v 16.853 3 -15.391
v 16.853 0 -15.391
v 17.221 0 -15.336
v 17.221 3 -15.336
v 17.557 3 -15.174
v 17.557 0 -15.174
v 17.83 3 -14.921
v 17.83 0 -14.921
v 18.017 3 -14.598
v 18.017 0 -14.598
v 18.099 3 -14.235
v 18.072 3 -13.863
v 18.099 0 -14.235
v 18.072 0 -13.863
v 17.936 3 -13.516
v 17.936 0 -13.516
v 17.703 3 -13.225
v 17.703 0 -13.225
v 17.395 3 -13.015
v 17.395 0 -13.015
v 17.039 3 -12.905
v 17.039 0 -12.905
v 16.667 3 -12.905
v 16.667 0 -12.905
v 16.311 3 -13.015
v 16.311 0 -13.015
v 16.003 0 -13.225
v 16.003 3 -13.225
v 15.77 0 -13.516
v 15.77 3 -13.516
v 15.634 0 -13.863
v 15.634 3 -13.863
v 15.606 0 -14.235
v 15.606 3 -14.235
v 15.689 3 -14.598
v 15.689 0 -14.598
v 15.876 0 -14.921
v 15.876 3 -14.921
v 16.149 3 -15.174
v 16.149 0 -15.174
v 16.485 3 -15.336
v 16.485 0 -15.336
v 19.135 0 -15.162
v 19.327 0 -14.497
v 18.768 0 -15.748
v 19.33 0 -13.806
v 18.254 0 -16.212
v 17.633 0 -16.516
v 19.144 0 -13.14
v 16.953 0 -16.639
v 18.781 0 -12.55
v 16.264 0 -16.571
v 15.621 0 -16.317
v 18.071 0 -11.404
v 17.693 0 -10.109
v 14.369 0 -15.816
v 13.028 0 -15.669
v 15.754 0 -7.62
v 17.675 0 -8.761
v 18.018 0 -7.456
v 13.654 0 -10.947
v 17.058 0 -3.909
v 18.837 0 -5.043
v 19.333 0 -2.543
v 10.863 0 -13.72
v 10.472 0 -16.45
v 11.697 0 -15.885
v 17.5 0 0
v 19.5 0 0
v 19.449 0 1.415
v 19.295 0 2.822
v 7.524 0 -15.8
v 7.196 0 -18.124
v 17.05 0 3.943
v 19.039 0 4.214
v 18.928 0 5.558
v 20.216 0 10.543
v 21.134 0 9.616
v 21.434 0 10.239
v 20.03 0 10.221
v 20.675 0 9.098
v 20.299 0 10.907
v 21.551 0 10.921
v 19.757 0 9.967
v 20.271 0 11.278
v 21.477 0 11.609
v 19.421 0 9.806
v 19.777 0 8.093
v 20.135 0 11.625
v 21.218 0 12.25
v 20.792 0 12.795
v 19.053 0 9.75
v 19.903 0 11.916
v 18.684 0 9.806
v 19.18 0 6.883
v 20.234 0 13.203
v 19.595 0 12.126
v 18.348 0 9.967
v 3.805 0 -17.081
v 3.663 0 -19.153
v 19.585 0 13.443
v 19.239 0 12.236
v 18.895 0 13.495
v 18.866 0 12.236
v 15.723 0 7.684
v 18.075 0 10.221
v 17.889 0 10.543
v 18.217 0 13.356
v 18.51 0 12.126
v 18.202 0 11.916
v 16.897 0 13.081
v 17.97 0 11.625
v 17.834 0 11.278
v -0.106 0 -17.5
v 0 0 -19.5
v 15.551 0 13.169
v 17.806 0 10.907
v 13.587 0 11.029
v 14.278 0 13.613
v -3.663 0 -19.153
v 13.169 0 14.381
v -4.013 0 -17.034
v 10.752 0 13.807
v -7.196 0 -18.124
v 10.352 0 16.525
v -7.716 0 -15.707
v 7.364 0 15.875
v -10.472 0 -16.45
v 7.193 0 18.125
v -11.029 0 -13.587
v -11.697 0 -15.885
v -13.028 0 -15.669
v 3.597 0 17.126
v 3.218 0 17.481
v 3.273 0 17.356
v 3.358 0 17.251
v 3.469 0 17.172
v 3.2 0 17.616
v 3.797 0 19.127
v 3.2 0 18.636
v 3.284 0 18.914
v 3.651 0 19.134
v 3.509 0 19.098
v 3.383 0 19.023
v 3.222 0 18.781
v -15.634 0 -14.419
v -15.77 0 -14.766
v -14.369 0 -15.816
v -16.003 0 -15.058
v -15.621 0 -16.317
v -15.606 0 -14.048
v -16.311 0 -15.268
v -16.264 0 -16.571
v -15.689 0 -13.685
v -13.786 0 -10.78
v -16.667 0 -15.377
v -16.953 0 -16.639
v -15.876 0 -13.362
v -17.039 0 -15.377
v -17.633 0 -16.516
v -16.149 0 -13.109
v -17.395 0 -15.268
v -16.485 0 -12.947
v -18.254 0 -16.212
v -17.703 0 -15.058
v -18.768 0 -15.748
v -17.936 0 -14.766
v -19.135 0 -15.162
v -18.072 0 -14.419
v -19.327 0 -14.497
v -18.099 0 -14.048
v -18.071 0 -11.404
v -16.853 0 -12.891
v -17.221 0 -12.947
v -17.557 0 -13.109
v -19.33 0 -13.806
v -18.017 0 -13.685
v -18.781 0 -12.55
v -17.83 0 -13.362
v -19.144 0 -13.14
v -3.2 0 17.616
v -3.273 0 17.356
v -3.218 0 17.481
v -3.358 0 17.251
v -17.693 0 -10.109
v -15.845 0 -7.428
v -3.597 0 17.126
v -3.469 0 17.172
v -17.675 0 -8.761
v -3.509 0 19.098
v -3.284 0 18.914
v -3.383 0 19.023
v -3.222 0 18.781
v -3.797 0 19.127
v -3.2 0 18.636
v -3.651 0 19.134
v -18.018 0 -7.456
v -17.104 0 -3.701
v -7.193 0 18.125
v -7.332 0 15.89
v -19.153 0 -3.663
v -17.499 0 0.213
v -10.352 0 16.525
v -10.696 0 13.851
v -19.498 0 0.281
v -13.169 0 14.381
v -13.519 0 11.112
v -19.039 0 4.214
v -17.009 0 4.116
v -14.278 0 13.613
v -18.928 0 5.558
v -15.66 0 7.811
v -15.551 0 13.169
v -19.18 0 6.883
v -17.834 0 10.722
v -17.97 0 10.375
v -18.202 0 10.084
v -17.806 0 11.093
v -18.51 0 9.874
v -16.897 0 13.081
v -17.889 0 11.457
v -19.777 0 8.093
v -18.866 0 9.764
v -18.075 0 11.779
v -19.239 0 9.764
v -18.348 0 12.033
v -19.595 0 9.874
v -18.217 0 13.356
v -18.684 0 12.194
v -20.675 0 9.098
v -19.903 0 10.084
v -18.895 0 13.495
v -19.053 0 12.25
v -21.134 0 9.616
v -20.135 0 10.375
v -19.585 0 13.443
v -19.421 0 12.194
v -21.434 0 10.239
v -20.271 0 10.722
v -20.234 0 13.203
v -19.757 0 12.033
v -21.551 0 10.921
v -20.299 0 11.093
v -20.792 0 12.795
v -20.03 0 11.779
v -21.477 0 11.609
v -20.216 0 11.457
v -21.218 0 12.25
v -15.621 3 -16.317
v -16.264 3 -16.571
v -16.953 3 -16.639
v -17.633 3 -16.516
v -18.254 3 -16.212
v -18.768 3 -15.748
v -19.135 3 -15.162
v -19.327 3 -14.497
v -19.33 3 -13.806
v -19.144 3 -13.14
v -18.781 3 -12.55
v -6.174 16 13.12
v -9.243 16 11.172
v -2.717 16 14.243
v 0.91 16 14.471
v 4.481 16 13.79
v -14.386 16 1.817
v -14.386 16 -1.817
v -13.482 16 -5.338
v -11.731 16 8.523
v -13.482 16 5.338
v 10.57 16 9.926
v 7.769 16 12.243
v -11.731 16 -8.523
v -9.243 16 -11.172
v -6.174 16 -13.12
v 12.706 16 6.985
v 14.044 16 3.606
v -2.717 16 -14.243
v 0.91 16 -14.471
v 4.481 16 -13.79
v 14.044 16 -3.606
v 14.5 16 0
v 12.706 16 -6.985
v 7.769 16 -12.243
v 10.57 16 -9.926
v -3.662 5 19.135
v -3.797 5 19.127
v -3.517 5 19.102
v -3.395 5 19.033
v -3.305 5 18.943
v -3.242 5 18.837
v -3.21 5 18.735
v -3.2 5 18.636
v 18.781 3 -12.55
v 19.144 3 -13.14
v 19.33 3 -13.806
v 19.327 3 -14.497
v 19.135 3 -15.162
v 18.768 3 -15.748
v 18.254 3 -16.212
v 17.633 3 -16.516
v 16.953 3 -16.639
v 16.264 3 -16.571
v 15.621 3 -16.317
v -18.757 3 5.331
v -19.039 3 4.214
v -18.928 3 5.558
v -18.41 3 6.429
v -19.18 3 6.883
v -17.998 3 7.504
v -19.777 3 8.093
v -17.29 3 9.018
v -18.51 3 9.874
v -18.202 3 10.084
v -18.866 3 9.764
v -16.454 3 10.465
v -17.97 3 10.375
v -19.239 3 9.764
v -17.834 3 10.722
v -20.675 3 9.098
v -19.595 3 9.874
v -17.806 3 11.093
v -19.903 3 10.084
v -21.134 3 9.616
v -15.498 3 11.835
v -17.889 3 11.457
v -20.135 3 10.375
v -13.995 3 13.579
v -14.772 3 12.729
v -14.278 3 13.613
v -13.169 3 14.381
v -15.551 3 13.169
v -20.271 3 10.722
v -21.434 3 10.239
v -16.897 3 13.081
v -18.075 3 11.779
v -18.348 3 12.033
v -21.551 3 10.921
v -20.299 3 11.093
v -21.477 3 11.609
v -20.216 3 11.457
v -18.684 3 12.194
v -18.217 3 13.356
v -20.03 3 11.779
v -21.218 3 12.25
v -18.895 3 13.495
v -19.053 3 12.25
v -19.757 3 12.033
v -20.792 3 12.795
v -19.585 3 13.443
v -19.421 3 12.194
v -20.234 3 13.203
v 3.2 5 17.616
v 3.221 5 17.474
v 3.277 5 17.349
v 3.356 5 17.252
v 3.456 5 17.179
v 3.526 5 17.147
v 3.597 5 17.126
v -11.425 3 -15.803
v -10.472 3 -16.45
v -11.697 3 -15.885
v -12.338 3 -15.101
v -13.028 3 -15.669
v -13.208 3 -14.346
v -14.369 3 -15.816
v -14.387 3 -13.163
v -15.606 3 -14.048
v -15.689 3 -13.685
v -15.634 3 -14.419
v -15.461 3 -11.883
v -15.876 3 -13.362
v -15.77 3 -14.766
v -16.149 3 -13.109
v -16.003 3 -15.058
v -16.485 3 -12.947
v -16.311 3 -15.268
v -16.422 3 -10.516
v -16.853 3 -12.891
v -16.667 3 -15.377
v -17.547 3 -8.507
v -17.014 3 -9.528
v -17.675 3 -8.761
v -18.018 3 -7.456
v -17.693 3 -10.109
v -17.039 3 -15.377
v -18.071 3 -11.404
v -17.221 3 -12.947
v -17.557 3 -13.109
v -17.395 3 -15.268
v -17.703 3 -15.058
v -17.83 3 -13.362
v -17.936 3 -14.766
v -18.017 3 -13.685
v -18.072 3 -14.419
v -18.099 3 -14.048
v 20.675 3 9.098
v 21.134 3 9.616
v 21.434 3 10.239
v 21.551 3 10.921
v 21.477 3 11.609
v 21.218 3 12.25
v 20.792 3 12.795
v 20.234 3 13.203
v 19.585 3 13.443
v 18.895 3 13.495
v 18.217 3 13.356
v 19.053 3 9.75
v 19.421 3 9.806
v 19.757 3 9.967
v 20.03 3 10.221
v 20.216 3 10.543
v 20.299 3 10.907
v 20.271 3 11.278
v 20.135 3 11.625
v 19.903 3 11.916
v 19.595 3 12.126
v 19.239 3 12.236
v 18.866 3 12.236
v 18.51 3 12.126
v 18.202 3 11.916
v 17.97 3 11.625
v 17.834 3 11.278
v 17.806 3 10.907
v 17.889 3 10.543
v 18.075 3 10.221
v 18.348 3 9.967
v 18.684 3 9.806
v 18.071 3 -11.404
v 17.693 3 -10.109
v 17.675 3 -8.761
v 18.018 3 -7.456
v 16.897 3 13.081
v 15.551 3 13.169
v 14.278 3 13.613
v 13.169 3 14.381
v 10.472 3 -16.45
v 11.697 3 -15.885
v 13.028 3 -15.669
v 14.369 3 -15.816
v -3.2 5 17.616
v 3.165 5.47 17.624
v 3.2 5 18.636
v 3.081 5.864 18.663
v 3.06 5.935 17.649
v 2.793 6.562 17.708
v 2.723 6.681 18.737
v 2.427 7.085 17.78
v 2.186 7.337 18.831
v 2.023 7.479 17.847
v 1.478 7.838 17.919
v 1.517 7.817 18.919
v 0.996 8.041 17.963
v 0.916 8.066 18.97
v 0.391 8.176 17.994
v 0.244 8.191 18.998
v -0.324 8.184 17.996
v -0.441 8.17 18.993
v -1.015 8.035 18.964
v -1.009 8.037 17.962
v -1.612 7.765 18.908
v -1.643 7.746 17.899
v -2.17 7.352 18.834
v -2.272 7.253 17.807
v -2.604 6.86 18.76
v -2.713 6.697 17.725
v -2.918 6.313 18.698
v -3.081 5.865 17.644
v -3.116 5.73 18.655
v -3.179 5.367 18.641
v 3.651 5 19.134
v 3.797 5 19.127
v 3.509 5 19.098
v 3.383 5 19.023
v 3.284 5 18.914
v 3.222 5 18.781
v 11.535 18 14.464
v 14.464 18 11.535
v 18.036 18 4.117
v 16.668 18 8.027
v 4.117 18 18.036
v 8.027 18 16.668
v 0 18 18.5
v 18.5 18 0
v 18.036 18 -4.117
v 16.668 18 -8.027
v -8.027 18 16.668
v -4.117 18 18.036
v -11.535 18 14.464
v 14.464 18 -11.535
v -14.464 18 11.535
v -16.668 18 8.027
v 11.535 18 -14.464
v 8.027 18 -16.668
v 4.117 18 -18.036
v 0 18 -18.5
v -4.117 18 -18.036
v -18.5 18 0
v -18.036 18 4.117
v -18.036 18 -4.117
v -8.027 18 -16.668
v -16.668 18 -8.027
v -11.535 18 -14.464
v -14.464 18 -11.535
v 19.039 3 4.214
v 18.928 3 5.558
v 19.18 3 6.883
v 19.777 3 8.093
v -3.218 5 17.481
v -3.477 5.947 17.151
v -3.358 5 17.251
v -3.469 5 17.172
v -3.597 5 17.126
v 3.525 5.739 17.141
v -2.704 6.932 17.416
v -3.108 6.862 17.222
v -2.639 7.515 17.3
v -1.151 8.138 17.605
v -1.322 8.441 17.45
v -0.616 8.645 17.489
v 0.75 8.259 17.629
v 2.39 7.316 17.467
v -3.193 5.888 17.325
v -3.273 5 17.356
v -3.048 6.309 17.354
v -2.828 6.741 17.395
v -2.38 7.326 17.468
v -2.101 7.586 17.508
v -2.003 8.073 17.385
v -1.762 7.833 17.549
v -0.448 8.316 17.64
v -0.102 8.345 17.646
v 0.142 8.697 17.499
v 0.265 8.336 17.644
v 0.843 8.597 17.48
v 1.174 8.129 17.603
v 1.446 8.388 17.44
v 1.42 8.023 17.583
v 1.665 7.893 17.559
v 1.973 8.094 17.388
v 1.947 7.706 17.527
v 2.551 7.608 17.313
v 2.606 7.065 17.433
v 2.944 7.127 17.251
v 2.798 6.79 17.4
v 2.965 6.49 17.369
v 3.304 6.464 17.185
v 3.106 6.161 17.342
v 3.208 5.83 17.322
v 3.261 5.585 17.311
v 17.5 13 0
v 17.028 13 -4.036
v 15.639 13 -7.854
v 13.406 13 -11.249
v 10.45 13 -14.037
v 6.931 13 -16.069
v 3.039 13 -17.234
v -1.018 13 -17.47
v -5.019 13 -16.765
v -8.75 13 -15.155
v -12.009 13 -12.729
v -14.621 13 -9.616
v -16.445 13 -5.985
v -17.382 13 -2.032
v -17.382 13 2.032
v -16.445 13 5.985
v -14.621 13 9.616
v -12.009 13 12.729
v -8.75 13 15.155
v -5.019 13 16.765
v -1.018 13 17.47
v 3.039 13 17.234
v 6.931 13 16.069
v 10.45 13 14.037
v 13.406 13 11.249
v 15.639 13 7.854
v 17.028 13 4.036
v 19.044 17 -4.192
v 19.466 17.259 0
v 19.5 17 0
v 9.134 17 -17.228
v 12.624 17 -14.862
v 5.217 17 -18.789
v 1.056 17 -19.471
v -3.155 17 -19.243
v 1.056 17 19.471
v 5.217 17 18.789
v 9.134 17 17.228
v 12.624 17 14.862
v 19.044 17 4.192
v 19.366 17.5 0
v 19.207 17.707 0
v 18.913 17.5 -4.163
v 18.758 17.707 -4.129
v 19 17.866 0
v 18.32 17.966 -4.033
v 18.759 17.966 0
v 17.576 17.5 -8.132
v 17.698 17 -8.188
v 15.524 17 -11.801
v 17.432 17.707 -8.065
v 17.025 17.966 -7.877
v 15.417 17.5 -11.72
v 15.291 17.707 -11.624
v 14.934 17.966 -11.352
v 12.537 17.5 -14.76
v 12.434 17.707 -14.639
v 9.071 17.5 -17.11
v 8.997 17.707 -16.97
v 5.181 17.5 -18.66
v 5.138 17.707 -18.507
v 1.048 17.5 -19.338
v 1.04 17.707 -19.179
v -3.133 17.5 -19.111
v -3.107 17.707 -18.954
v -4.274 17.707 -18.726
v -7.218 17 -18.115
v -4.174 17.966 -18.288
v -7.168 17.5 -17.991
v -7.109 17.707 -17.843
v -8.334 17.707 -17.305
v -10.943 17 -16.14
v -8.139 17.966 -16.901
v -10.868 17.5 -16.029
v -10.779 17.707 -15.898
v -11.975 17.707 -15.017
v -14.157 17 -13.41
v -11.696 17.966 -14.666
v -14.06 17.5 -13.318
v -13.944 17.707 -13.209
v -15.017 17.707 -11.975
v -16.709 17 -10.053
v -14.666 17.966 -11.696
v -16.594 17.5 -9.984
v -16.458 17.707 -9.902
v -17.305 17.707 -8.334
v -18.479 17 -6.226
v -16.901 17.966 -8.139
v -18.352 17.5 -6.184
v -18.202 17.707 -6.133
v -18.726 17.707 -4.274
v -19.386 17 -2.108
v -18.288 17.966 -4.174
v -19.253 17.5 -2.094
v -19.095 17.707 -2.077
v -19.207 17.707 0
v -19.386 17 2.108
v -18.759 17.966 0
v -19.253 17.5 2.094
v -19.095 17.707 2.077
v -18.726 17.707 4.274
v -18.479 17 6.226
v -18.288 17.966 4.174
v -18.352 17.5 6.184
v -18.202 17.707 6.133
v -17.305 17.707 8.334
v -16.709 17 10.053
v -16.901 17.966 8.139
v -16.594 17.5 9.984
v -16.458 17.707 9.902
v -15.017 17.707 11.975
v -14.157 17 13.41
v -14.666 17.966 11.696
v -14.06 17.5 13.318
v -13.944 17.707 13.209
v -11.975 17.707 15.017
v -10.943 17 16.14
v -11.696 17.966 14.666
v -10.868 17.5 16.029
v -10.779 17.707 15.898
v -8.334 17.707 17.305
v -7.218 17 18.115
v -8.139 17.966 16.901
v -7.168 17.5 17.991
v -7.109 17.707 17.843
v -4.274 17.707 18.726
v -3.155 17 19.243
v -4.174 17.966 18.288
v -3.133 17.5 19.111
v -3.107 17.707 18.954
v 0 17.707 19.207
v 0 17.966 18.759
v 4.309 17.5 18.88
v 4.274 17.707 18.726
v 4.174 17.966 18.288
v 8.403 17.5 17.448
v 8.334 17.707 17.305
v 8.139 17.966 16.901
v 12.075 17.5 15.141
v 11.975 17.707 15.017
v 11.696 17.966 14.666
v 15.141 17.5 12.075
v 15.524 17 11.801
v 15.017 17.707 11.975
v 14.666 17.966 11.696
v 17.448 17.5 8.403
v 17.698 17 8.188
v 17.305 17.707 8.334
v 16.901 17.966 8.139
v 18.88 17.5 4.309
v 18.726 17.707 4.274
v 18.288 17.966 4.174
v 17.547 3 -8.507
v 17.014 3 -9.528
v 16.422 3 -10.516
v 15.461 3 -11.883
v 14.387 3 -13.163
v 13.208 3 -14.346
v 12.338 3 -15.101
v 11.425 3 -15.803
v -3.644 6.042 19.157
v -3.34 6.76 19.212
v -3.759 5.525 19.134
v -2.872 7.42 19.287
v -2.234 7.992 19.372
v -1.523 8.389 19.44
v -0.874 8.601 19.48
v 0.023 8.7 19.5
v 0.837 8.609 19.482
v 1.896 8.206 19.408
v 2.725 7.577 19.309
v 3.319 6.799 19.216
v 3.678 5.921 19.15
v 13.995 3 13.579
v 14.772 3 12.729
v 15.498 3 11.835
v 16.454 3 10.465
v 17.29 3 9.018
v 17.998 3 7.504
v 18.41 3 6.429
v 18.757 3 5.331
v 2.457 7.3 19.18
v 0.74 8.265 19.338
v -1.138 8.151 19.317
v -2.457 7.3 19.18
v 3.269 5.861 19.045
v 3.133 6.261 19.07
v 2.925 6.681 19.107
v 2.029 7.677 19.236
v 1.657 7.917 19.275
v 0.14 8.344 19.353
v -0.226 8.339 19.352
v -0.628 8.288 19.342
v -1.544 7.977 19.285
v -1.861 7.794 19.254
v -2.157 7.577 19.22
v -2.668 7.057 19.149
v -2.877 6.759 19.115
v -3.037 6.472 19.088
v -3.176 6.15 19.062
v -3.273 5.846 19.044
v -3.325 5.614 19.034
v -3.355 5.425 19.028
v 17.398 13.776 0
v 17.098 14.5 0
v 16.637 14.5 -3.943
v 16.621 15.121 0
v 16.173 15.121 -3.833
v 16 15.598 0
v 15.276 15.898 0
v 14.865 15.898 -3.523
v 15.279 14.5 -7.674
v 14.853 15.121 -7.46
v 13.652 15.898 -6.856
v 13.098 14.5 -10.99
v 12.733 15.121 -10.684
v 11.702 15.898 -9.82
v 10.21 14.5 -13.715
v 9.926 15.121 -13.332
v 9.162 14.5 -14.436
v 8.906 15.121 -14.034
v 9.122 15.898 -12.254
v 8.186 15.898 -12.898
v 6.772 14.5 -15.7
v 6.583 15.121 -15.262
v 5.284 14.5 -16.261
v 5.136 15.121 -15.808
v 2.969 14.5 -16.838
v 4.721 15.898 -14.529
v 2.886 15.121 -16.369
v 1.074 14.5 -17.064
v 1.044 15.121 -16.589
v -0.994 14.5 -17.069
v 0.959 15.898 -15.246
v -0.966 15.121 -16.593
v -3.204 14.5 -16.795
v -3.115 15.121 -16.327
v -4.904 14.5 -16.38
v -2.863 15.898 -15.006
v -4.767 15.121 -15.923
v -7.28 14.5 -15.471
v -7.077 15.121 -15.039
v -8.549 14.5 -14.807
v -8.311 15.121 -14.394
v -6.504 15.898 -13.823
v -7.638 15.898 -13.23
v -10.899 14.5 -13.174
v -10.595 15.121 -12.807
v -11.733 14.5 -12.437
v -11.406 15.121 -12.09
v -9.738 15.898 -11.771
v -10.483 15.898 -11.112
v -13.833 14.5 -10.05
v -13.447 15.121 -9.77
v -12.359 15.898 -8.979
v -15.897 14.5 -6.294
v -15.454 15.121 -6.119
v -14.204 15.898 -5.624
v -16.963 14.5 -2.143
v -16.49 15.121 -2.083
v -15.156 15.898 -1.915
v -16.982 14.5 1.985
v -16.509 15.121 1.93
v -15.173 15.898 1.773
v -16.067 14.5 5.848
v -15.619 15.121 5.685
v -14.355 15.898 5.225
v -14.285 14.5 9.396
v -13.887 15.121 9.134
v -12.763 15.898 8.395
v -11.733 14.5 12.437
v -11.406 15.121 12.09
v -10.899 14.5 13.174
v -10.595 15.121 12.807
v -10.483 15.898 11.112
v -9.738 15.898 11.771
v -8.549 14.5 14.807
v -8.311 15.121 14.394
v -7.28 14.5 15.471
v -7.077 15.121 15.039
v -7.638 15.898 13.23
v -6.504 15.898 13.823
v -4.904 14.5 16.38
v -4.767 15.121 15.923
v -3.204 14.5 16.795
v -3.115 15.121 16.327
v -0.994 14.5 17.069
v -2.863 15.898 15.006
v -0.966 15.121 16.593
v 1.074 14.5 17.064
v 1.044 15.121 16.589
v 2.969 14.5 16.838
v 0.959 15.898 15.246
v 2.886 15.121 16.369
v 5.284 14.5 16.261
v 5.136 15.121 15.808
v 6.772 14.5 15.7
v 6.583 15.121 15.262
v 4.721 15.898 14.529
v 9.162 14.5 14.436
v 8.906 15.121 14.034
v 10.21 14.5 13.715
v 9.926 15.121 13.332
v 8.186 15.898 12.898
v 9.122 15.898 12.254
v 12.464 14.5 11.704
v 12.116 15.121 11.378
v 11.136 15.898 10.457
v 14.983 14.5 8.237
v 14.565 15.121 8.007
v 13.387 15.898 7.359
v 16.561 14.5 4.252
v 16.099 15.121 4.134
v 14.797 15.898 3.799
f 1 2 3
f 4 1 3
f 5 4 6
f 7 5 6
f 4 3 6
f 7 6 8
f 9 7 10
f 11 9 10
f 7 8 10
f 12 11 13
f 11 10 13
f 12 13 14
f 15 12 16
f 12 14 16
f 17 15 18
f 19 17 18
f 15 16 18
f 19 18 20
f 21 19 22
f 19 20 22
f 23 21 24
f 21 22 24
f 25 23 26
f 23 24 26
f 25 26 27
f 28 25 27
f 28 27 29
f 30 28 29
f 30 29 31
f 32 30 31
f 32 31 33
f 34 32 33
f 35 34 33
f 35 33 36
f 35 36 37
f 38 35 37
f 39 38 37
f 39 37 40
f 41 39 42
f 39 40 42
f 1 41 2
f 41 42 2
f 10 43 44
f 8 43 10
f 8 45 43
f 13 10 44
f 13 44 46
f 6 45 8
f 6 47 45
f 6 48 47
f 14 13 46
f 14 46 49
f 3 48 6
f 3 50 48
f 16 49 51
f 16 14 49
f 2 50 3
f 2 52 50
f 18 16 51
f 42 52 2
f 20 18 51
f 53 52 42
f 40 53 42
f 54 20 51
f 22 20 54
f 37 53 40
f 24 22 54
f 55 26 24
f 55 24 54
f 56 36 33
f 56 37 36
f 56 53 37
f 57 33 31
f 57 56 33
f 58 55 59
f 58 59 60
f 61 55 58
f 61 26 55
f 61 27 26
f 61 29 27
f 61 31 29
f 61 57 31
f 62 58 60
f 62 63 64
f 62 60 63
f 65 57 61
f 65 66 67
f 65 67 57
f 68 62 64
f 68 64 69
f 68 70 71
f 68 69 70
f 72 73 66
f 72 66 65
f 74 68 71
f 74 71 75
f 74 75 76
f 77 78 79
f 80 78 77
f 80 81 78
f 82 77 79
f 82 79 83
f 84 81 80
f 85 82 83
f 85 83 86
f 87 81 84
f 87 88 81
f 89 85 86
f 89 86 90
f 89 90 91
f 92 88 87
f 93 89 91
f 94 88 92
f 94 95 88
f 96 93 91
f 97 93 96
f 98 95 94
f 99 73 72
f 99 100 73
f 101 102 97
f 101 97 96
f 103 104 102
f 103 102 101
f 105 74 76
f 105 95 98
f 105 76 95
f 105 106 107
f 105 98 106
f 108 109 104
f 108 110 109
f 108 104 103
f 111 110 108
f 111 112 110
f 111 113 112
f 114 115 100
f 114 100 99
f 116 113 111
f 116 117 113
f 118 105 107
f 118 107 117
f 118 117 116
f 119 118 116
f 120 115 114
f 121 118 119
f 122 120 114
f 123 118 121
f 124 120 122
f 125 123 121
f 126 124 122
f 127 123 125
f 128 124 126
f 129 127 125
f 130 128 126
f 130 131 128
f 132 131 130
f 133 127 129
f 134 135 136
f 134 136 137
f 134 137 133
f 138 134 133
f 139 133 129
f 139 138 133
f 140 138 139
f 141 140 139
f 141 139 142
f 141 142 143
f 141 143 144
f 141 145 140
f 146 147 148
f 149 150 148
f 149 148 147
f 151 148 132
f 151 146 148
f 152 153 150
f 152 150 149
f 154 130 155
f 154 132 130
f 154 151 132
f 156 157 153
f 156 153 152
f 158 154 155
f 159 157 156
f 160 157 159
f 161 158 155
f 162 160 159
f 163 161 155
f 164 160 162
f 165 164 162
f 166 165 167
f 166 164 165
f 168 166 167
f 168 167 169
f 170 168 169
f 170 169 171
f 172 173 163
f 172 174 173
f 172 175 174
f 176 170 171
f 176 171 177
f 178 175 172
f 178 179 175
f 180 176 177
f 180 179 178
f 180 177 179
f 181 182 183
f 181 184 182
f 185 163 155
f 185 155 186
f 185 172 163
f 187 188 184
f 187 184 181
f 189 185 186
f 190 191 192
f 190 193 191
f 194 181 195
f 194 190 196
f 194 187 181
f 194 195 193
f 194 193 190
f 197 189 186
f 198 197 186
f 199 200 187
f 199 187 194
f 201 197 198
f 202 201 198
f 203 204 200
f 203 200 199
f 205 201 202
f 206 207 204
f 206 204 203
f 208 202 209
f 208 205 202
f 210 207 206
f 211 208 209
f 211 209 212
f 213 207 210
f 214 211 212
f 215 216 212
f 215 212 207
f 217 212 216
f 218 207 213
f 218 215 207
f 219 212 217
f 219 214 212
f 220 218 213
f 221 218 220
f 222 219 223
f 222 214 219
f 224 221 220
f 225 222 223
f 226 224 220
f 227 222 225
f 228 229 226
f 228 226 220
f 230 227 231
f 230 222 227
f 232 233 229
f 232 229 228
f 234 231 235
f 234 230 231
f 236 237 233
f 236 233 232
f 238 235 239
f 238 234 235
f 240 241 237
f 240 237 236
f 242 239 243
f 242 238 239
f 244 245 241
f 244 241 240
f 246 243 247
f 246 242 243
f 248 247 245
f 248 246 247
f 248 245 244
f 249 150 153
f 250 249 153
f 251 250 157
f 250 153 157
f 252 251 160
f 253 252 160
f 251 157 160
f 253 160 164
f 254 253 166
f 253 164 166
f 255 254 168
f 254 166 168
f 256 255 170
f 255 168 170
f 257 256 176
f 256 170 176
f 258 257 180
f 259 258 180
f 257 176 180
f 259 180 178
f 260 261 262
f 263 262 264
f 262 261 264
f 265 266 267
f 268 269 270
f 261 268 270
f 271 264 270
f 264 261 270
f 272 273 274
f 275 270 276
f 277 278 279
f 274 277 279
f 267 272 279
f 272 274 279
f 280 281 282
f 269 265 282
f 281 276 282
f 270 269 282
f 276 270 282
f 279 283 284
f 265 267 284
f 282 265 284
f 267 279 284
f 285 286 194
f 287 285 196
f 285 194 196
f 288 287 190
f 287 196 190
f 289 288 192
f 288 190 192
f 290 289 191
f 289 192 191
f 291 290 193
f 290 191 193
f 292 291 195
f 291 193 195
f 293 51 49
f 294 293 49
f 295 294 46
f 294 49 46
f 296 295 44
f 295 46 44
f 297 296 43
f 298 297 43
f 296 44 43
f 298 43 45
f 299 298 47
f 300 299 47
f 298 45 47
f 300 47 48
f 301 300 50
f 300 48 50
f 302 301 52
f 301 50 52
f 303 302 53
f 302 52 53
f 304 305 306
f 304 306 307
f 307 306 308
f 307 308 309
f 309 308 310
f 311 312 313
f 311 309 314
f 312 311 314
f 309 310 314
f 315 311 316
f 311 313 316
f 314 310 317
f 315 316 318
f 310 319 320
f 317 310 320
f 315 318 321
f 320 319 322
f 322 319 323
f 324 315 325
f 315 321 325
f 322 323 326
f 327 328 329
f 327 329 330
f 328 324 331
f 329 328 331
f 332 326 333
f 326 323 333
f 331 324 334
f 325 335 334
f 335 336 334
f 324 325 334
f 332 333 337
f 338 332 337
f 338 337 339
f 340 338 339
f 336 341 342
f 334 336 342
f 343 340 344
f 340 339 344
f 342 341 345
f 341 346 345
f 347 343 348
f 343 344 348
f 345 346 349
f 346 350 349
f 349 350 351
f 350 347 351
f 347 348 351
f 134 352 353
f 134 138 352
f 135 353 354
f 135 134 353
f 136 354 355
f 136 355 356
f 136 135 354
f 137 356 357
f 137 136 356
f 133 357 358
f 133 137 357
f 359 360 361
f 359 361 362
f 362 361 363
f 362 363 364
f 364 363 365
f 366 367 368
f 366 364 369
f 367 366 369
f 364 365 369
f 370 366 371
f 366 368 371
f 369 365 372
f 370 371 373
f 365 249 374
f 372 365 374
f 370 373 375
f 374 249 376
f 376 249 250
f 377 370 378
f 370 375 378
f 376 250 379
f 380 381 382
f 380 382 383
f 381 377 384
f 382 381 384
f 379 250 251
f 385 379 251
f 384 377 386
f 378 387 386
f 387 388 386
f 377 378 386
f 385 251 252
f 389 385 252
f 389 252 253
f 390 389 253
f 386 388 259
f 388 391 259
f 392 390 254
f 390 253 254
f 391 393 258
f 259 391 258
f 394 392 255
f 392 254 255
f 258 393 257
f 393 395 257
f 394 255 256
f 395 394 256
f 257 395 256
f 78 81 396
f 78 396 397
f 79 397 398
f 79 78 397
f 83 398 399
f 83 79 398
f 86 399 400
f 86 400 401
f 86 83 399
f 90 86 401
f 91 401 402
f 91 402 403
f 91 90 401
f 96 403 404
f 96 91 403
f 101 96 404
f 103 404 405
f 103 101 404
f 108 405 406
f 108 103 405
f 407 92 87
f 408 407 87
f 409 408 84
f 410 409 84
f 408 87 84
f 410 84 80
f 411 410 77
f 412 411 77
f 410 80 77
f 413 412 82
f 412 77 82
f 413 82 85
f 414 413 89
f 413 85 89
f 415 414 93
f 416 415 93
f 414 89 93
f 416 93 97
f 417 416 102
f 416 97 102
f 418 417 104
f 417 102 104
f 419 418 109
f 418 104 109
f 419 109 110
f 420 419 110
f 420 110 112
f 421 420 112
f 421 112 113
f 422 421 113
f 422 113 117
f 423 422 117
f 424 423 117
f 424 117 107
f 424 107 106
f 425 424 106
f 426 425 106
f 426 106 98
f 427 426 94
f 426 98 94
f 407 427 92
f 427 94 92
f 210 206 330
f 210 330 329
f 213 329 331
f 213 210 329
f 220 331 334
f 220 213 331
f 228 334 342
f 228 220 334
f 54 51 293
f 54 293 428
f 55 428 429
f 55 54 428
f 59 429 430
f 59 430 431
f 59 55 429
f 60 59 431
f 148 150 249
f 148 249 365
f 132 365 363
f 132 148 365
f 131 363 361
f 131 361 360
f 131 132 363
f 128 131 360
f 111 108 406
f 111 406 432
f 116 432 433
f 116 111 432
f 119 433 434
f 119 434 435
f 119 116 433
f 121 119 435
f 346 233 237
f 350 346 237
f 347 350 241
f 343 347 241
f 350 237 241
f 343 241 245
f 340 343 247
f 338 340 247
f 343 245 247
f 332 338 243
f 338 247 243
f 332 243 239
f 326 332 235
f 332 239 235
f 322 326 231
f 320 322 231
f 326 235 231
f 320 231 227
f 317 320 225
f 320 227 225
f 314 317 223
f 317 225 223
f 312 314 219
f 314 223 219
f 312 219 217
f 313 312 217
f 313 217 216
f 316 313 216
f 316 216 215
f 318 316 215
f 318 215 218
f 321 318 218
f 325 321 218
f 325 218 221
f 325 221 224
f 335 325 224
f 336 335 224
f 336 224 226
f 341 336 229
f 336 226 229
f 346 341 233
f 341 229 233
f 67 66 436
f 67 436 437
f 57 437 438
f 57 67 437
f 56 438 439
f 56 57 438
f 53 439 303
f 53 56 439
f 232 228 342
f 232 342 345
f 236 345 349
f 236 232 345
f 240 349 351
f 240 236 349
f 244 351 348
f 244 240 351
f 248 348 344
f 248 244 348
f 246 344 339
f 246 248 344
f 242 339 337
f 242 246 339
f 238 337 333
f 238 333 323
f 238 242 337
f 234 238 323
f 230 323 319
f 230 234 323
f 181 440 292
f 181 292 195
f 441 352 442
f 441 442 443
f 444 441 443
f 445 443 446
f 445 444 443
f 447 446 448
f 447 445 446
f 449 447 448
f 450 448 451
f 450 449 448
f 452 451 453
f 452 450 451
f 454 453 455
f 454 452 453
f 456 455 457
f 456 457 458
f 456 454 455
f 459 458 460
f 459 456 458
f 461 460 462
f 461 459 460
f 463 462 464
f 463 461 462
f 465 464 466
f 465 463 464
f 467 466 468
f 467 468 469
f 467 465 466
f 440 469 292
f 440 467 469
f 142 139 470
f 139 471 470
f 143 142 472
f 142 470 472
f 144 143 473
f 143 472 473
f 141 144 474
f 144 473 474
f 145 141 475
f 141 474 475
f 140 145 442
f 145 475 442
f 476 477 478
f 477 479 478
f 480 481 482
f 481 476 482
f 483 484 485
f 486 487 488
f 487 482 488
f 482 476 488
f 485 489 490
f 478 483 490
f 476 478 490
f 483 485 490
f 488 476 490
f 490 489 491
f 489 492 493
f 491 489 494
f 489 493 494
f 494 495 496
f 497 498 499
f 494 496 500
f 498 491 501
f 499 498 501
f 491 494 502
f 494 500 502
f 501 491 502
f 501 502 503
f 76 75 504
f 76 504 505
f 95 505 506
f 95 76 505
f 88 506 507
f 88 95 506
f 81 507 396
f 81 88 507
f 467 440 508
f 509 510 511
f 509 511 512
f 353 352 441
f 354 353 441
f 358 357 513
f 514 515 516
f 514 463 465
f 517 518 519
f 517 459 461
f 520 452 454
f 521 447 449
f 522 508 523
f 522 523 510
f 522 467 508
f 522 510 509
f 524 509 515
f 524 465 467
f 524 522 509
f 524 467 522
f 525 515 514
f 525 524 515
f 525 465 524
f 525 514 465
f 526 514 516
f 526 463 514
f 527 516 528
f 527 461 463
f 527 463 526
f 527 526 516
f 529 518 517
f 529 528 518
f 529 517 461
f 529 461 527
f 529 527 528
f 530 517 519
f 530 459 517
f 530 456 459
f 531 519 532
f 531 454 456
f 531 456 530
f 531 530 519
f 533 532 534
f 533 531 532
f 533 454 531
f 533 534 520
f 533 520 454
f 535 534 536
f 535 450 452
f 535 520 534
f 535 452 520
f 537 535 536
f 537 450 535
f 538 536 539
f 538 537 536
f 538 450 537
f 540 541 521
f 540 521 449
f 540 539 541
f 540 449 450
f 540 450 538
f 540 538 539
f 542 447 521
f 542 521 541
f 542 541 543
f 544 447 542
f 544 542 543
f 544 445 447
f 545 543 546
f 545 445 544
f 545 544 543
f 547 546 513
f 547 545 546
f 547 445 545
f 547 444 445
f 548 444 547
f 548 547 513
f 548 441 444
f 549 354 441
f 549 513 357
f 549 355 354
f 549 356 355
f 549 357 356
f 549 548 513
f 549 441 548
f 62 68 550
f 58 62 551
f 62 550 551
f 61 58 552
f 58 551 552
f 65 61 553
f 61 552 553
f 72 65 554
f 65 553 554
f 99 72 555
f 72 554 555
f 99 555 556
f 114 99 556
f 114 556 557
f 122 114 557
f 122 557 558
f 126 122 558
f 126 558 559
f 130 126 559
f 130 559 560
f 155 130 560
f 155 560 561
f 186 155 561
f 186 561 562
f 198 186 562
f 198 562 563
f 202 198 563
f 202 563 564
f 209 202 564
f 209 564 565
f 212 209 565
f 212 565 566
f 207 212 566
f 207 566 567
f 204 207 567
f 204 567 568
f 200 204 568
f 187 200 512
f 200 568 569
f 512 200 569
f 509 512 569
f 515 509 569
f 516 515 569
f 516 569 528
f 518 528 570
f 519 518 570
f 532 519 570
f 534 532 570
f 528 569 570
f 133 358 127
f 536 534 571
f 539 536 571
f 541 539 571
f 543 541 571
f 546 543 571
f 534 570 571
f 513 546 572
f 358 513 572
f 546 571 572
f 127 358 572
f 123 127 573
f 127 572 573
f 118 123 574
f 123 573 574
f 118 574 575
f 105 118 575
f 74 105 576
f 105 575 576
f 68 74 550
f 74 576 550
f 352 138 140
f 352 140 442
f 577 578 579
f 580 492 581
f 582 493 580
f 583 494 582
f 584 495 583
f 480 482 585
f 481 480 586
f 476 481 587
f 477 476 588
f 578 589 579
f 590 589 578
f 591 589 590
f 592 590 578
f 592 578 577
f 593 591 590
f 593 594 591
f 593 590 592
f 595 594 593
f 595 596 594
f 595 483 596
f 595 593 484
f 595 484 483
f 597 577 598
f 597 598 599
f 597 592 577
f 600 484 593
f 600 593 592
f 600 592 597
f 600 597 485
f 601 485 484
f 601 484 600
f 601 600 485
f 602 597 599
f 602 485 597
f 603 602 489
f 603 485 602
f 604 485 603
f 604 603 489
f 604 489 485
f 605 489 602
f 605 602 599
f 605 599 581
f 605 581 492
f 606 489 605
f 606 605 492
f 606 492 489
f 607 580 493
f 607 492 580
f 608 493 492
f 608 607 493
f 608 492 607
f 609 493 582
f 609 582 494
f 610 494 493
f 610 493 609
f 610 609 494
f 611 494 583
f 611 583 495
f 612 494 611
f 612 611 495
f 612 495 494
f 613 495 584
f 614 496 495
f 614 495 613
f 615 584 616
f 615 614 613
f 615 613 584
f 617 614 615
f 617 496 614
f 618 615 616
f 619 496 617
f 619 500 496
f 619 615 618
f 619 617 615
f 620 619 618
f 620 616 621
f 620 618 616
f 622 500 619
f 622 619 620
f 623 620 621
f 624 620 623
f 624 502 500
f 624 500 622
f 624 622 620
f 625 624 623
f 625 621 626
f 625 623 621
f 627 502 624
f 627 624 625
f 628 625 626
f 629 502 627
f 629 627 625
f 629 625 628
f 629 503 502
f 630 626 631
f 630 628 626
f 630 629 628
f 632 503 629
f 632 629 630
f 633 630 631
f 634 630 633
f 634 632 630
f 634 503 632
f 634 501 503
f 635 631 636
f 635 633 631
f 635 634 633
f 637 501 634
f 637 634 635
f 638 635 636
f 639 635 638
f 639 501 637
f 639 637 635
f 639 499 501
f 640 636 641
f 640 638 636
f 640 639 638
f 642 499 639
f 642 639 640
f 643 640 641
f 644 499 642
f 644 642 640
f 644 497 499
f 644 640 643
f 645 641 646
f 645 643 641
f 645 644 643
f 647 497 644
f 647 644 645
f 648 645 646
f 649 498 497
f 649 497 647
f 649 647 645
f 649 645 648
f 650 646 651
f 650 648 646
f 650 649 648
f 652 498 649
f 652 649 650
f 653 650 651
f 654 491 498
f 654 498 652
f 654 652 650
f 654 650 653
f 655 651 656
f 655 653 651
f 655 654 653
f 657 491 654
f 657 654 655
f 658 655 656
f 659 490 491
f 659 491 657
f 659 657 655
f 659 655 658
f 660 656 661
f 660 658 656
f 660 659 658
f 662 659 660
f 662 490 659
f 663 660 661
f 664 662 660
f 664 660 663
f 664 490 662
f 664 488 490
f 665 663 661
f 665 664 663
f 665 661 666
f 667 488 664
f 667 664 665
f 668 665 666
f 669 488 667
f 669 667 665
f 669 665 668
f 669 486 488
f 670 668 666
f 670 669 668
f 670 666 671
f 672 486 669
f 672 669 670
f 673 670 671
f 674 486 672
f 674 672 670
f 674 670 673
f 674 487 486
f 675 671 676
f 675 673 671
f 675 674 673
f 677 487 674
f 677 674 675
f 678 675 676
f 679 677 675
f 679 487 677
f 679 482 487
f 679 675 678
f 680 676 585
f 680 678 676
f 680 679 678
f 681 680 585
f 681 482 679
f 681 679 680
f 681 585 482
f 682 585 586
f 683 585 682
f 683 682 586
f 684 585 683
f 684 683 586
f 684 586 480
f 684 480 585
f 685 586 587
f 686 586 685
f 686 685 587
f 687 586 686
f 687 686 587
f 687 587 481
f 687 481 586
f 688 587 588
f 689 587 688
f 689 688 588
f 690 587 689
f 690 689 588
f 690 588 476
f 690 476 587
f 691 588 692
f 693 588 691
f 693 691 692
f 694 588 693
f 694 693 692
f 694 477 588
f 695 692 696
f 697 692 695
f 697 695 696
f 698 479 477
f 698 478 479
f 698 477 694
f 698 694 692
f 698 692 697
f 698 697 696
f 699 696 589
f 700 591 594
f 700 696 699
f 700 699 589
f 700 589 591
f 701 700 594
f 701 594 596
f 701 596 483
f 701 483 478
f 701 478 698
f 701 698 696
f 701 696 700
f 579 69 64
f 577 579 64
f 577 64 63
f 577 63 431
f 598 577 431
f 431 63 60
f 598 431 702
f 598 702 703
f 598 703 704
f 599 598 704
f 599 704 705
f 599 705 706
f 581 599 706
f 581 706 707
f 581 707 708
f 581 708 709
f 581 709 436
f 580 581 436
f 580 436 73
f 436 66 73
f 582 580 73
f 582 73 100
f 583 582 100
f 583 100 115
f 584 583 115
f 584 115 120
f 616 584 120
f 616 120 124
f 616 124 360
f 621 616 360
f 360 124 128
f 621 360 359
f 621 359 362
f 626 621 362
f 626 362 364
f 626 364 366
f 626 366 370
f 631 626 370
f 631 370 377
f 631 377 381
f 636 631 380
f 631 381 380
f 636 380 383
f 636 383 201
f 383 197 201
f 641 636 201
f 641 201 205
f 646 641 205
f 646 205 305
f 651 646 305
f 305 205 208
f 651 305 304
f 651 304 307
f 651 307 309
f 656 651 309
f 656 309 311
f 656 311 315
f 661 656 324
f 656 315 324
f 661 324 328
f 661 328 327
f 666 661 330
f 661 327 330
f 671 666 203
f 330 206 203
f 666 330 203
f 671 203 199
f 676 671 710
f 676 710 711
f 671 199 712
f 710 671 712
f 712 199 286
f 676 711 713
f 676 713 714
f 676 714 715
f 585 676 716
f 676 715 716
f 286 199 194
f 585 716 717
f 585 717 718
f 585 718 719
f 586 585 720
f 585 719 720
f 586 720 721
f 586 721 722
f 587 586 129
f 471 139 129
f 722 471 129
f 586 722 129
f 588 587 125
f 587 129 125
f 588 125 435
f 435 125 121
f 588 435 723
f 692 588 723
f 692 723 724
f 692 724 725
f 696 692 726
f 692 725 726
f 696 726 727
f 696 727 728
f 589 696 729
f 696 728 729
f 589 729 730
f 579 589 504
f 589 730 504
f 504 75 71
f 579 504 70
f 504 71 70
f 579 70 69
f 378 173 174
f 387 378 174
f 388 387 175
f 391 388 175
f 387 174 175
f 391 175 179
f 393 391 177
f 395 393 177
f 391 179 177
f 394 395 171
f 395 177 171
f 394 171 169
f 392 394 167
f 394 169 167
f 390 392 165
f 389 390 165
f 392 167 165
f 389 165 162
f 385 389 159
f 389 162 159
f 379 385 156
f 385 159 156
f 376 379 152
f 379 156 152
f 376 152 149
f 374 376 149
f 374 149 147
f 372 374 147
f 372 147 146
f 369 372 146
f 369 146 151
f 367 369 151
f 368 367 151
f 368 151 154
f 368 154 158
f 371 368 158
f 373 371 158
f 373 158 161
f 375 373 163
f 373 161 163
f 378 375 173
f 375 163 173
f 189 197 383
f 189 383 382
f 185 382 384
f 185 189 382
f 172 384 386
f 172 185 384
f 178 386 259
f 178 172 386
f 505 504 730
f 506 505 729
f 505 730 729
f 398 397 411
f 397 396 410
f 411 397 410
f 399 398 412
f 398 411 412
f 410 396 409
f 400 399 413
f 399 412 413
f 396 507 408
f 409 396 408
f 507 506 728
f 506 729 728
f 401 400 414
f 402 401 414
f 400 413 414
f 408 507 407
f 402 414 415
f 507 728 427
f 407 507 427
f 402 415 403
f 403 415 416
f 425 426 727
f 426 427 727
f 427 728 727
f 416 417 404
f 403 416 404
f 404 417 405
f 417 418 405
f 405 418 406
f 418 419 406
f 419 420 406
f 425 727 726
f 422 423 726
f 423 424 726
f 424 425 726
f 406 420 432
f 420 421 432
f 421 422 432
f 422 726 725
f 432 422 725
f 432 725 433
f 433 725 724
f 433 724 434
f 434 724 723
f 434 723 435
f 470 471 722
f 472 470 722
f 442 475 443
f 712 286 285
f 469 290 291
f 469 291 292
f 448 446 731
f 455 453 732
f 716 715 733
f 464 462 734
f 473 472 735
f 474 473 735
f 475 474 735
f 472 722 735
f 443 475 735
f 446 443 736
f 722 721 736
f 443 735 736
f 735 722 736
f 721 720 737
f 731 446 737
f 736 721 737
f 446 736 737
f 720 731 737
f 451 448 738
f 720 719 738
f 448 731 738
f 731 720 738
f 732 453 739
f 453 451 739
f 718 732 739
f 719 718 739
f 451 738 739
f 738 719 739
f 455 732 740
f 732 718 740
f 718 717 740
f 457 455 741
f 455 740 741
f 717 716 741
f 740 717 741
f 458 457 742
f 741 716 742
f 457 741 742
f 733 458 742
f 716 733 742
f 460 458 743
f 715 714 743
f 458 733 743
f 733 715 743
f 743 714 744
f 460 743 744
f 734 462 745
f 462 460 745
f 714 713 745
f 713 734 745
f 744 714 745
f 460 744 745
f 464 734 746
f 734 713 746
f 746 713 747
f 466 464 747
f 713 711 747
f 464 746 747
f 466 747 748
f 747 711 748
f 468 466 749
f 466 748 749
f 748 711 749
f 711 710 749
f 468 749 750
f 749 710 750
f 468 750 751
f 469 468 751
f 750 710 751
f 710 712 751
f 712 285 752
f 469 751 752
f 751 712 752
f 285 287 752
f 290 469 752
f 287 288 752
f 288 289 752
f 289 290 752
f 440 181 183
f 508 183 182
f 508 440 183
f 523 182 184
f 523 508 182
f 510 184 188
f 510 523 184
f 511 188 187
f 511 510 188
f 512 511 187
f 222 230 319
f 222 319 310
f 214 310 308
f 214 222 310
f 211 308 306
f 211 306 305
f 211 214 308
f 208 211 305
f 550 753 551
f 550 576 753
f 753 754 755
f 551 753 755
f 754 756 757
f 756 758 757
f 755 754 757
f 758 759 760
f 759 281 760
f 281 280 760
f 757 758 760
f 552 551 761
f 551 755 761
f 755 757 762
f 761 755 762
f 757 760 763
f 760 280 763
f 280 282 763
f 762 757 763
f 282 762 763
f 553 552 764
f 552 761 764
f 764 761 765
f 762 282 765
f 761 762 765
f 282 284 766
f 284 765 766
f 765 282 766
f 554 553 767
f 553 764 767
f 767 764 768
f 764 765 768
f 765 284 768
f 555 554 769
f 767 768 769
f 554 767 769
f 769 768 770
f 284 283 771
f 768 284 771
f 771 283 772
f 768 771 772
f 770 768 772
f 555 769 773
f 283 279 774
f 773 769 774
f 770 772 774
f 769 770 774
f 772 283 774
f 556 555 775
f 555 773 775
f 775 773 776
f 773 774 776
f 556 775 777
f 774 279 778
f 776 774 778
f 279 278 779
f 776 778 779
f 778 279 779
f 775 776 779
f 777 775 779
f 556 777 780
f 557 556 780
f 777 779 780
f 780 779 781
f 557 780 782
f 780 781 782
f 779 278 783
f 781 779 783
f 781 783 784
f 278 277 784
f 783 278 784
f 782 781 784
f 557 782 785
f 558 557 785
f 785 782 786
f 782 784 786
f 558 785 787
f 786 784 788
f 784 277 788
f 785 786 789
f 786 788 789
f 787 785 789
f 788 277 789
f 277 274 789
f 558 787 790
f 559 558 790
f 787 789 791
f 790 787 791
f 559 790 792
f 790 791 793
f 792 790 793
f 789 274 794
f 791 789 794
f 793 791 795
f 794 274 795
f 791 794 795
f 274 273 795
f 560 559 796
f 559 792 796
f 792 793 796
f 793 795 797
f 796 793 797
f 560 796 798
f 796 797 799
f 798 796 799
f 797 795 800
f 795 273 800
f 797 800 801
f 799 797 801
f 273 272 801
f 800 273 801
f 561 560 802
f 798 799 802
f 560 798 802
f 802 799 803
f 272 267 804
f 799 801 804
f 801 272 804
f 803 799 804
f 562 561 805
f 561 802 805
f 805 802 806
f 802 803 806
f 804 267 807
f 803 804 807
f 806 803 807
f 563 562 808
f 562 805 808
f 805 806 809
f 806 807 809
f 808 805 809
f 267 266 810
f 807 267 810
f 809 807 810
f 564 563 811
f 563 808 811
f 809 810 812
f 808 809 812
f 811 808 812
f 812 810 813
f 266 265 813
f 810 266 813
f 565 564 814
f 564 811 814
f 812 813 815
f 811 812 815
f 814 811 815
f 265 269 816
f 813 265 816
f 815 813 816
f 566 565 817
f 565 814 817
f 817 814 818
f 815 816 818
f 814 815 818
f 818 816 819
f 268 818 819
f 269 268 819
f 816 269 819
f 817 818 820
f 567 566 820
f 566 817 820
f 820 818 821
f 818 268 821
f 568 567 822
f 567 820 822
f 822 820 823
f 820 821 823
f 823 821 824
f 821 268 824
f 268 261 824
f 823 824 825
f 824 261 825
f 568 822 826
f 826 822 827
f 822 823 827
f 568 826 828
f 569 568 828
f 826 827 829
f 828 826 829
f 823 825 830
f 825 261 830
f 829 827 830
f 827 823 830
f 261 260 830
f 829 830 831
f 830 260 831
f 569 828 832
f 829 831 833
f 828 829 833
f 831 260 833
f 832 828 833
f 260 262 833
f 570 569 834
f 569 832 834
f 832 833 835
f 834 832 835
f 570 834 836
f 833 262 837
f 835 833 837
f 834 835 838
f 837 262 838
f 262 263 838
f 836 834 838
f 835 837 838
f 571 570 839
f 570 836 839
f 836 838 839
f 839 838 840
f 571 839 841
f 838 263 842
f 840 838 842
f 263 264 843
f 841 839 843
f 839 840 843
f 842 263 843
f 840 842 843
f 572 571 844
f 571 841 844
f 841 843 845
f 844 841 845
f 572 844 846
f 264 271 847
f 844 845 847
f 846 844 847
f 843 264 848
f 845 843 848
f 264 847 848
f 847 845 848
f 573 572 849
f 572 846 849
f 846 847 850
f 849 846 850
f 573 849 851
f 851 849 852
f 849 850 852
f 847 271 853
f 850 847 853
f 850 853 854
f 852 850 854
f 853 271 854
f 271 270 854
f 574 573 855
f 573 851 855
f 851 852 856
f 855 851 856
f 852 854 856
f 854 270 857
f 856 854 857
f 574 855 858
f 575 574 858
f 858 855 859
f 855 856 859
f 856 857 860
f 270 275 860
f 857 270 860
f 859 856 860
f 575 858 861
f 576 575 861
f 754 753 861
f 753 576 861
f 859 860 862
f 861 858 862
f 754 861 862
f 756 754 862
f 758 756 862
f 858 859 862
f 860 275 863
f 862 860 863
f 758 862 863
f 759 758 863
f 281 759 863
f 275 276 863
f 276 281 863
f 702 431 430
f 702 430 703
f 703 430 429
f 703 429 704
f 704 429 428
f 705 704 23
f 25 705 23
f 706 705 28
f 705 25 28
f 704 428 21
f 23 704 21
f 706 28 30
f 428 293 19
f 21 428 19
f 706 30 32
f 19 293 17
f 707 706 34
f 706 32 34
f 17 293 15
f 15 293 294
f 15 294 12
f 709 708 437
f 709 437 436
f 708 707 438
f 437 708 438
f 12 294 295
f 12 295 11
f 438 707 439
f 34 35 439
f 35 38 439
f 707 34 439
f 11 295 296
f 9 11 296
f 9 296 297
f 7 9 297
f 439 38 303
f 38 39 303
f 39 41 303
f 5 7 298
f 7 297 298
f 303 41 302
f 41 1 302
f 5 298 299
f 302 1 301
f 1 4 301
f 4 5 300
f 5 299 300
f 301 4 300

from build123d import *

# Parameters (mm, degrees)
SKETCH_2_R                  = 1.25
EXTRUDE_1491_DEPTH          = 3
FILLET_2_R                  = 3
FILLET_1631_R               = 5
CUT_EXTRUDE_2422_REACH      = 36.187
CUT_EXTRUDE_2422_END_RADIUS = 19.5
FILLET_4_R                  = 0.5
FILLET_5_R                  = 1


with BuildPart() as part:
    # Эскиз1 → Повернуть1 (revolve)
    with BuildSketch(Plane.XY):
        Polygon((0, 16), (0, 18), (19.5, 18), (19.5, 0), (17.5, 0), (17.5, 16), align=None)
    revolve(axis=Axis((0, 16, 0), (0, 1, 0)))

    # Эскиз2 → Extrude 1491 (add)
    # profile 1 of 4: a face of its own
    with BuildSketch(Plane.XZ):
        with BuildLine():
            Line((15.246008724, -16.056438521), (13.207625443, -14.346031861))
            ThreePointArc((13.207625443, -14.346031861), (14.937866641, -12.534358389), (16.421563491, -10.515809646))
            Line((16.421563491, -10.515809646), (18.459946773, -12.226216305))
            ThreePointArc((18.459946773, -12.226216305), (18.768088856, -15.748296437), (15.246008724, -16.056438521))
        make_face()
        with Locations(Location((16.852977749, -14.141327413, 0), (0, 0, 270))):
            Circle(SKETCH_2_R, mode=Mode.SUBTRACT)
    # profile 2 of 4: a face of its own
    with BuildSketch(Plane.XZ):
        with BuildLine():
            Line((-18.459946773, -12.226216305), (-16.421563491, -10.515809646))
            ThreePointArc((-16.421563491, -10.515809646), (-14.937866641, -12.534358389), (-13.207625443, -14.346031861))
            Line((-13.207625443, -14.346031861), (-15.246008724, -16.056438521))
            ThreePointArc((-15.246008724, -16.056438521), (-18.768088856, -15.748296437), (-18.459946773, -12.226216305))
        make_face()
        with Locations(Location((-16.852977749, -14.141327413, 0), (0, 0, 90))):
            Circle(SKETCH_2_R, mode=Mode.SUBTRACT)
    # profile 3 of 4: a face of its own
    with BuildSketch(Plane.XZ):
        with BuildLine():
            Line((17.802558883, 13.165063509), (15.498134224, 11.834603312))
            ThreePointArc((15.498134224, 11.834603312), (16.887495374, 9.75), (17.998134224, 7.504476293))
            Line((17.998134224, 7.504476293), (20.302558883, 8.834936491))
            ThreePointArc((20.302558883, 8.834936491), (21.217622393, 12.25), (17.802558883, 13.165063509))
        make_face()
        with Locations(Location((19.052558883, 11, 0), (0, 0, 270))):
            Circle(SKETCH_2_R, mode=Mode.SUBTRACT)
    # profile 4 of 4: a face of its own
    with BuildSketch(Plane.XZ):
        with BuildLine():
            Line((-20.302558883, 8.834936491), (-17.998134224, 7.504476293))
            ThreePointArc((-17.998134224, 7.504476293), (-16.887495374, 9.75), (-15.498134224, 11.834603312))
            Line((-15.498134224, 11.834603312), (-17.802558883, 13.165063509))
            ThreePointArc((-17.802558883, 13.165063509), (-21.217622393, 12.25), (-20.302558883, 8.834936491))
        make_face()
        with Locations(Location((-19.052558883, 11, 0), (0, 0, 90))):
            Circle(SKETCH_2_R, mode=Mode.SUBTRACT)
    extrude(amount=-EXTRUDE_1491_DEPTH)

    # Скругление2
    fillet_2_edges = [part.edges().sort_by_distance(p)[0] for p in [
        (-17.5, 16, 0),
    ]]
    fillet(fillet_2_edges, radius=FILLET_2_R)

    # Fillet 1631
    # the kernel refuses this fillet: 5 mm, written as the material it adds along each edge
    with BuildSketch(Plane(origin=(15.498134224, 0, 11.834603312), x_dir=(-0.6748484545014423, 0, 0.7379563425142538), z_dir=(0, 1, 0)), Plane(origin=(16.421563491, 0, -10.515809646), x_dir=(0.46264036439110967, 0, 0.8865460468785934), z_dir=(0, 1, 0)), Plane(origin=(-13.207625443, 0, -14.346031861), x_dir=(0.7927407641766817, 0, -0.6095589231670477), z_dir=(0, 1, 0)), Plane(origin=(-17.998134224, 0, 7.504476293), x_dir=(-0.301664712250469, 0, -0.9534140765600442), z_dir=(0, 1, 0))) as fillet_1631_piece_1:
        with BuildLine():
            CenterArc((3.893371259, 4.980387232), FILLET_1631_R, 202.918064629, 62.005438268)
            Line((-0.711942111, 3.033315388), (-1.172473448, 2.838608203))
            ThreePointArc((-1.172473448, 2.838608203), (-1.061572462, 2.490694934), (-0.488256583, -0.107728867))
            Line((-0.488256583, -0.107728867), (0.044242855, -0.498038723))
            ThreePointArc((0.044242855, -0.498038723), (1.725471354, -0.423510203), (3.406699852, -0.498038723))
            Line((3.406699852, -0.498038723), (3.450942707, 0))
        make_face()
    extrude(amount=3)
    with BuildSketch(Plane(origin=(17.998134224, 0, 7.504476293), x_dir=(0.3016647122504697, 0, -0.953414076560044), z_dir=(0, 1, 0)), Plane(origin=(13.207625443, 0, -14.346031861), x_dir=(-0.7927407641766814, 0, -0.609558923167048), z_dir=(0, 1, 0)), Plane(origin=(-16.421563491, 0, -10.515809646), x_dir=(-0.46264036439110884, 0, 0.886546046878594), z_dir=(0, 1, 0)), Plane(origin=(-15.498134224, 0, 11.834603312), x_dir=(0.674848454501442, 0, 0.7379563425142541), z_dir=(0, 1, 0))) as fillet_1631_piece_2:
        with BuildLine():
            CenterArc((3.893371259, -4.980387232), FILLET_1631_R, 95.076497103, 62.005438268)
            Line((-0.711942111, -3.033315388), (-1.172473448, -2.838608203))
            ThreePointArc((-1.172473448, -2.838608203), (-1.061572462, -2.490694934), (-0.488256583, 0.107728867))
            Line((-0.488256583, 0.107728867), (0.044242855, 0.498038723))
            ThreePointArc((0.044242855, 0.498038723), (1.725471354, 0.423510203), (3.406699852, 0.498038723))
            Line((3.406699852, 0.498038723), (3.450942707, 0))
        make_face()
    extrude(amount=3)

    # Cut-Extrude 2422: up to this cylinder (the profile starts inside it)
    cut_extrude_2422_end = Plane(origin=(0, 3.790585, 0), z_dir=(0, -1, 0)) * Cylinder(CUT_EXTRUDE_2422_END_RADIUS, 112.374, mode=Mode.PRIVATE)
    # Эскиз4 → Cut-Extrude 2422 (cut, up to the surface)
    with BuildSketch(Plane.XY, mode=Mode.PRIVATE) as cut_extrude_2422_sk1:
        with BuildLine():
            Line((-3.2, 5), (-3.2, 0))
            Line((-3.2, 0), (3.2, 0))
            Line((3.2, 0), (3.2, 5))
            ThreePointArc((3.2, 5), (0, 8.2), (-3.2, 5))
        make_face()
    cut_extrude_2422_tool1 = extrude(cut_extrude_2422_sk1.sketch, amount=CUT_EXTRUDE_2422_REACH, mode=Mode.PRIVATE) & cut_extrude_2422_end
    add(cut_extrude_2422_tool1.solids().sort_by_distance((0, 3.790585, 0))[0], mode=Mode.SUBTRACT)

    # Скругление4
    fillet_4_edges = [part.edges().sort_by_distance(p)[0] for p in [
        (1e-09, 8.200000026, 19.49999998),
        (-3.2, 2.5, 19.235643998),
        (3.2, 2.5, 19.235643998),
        (-3.2, 2.5, 17.204941151),
        (-3e-09, 8.200000027, 17.499999979),
        (3.2, 2.5, 17.204941151),
    ]]
    fillet(fillet_4_edges, radius=FILLET_4_R)

    # Скругление5
    fillet_5_edges = [part.edges().sort_by_distance(p)[0] for p in [
        (-19.5, 18, 0),
    ]]
    fillet(fillet_5_edges, radius=FILLET_5_R)


solid = part.part
